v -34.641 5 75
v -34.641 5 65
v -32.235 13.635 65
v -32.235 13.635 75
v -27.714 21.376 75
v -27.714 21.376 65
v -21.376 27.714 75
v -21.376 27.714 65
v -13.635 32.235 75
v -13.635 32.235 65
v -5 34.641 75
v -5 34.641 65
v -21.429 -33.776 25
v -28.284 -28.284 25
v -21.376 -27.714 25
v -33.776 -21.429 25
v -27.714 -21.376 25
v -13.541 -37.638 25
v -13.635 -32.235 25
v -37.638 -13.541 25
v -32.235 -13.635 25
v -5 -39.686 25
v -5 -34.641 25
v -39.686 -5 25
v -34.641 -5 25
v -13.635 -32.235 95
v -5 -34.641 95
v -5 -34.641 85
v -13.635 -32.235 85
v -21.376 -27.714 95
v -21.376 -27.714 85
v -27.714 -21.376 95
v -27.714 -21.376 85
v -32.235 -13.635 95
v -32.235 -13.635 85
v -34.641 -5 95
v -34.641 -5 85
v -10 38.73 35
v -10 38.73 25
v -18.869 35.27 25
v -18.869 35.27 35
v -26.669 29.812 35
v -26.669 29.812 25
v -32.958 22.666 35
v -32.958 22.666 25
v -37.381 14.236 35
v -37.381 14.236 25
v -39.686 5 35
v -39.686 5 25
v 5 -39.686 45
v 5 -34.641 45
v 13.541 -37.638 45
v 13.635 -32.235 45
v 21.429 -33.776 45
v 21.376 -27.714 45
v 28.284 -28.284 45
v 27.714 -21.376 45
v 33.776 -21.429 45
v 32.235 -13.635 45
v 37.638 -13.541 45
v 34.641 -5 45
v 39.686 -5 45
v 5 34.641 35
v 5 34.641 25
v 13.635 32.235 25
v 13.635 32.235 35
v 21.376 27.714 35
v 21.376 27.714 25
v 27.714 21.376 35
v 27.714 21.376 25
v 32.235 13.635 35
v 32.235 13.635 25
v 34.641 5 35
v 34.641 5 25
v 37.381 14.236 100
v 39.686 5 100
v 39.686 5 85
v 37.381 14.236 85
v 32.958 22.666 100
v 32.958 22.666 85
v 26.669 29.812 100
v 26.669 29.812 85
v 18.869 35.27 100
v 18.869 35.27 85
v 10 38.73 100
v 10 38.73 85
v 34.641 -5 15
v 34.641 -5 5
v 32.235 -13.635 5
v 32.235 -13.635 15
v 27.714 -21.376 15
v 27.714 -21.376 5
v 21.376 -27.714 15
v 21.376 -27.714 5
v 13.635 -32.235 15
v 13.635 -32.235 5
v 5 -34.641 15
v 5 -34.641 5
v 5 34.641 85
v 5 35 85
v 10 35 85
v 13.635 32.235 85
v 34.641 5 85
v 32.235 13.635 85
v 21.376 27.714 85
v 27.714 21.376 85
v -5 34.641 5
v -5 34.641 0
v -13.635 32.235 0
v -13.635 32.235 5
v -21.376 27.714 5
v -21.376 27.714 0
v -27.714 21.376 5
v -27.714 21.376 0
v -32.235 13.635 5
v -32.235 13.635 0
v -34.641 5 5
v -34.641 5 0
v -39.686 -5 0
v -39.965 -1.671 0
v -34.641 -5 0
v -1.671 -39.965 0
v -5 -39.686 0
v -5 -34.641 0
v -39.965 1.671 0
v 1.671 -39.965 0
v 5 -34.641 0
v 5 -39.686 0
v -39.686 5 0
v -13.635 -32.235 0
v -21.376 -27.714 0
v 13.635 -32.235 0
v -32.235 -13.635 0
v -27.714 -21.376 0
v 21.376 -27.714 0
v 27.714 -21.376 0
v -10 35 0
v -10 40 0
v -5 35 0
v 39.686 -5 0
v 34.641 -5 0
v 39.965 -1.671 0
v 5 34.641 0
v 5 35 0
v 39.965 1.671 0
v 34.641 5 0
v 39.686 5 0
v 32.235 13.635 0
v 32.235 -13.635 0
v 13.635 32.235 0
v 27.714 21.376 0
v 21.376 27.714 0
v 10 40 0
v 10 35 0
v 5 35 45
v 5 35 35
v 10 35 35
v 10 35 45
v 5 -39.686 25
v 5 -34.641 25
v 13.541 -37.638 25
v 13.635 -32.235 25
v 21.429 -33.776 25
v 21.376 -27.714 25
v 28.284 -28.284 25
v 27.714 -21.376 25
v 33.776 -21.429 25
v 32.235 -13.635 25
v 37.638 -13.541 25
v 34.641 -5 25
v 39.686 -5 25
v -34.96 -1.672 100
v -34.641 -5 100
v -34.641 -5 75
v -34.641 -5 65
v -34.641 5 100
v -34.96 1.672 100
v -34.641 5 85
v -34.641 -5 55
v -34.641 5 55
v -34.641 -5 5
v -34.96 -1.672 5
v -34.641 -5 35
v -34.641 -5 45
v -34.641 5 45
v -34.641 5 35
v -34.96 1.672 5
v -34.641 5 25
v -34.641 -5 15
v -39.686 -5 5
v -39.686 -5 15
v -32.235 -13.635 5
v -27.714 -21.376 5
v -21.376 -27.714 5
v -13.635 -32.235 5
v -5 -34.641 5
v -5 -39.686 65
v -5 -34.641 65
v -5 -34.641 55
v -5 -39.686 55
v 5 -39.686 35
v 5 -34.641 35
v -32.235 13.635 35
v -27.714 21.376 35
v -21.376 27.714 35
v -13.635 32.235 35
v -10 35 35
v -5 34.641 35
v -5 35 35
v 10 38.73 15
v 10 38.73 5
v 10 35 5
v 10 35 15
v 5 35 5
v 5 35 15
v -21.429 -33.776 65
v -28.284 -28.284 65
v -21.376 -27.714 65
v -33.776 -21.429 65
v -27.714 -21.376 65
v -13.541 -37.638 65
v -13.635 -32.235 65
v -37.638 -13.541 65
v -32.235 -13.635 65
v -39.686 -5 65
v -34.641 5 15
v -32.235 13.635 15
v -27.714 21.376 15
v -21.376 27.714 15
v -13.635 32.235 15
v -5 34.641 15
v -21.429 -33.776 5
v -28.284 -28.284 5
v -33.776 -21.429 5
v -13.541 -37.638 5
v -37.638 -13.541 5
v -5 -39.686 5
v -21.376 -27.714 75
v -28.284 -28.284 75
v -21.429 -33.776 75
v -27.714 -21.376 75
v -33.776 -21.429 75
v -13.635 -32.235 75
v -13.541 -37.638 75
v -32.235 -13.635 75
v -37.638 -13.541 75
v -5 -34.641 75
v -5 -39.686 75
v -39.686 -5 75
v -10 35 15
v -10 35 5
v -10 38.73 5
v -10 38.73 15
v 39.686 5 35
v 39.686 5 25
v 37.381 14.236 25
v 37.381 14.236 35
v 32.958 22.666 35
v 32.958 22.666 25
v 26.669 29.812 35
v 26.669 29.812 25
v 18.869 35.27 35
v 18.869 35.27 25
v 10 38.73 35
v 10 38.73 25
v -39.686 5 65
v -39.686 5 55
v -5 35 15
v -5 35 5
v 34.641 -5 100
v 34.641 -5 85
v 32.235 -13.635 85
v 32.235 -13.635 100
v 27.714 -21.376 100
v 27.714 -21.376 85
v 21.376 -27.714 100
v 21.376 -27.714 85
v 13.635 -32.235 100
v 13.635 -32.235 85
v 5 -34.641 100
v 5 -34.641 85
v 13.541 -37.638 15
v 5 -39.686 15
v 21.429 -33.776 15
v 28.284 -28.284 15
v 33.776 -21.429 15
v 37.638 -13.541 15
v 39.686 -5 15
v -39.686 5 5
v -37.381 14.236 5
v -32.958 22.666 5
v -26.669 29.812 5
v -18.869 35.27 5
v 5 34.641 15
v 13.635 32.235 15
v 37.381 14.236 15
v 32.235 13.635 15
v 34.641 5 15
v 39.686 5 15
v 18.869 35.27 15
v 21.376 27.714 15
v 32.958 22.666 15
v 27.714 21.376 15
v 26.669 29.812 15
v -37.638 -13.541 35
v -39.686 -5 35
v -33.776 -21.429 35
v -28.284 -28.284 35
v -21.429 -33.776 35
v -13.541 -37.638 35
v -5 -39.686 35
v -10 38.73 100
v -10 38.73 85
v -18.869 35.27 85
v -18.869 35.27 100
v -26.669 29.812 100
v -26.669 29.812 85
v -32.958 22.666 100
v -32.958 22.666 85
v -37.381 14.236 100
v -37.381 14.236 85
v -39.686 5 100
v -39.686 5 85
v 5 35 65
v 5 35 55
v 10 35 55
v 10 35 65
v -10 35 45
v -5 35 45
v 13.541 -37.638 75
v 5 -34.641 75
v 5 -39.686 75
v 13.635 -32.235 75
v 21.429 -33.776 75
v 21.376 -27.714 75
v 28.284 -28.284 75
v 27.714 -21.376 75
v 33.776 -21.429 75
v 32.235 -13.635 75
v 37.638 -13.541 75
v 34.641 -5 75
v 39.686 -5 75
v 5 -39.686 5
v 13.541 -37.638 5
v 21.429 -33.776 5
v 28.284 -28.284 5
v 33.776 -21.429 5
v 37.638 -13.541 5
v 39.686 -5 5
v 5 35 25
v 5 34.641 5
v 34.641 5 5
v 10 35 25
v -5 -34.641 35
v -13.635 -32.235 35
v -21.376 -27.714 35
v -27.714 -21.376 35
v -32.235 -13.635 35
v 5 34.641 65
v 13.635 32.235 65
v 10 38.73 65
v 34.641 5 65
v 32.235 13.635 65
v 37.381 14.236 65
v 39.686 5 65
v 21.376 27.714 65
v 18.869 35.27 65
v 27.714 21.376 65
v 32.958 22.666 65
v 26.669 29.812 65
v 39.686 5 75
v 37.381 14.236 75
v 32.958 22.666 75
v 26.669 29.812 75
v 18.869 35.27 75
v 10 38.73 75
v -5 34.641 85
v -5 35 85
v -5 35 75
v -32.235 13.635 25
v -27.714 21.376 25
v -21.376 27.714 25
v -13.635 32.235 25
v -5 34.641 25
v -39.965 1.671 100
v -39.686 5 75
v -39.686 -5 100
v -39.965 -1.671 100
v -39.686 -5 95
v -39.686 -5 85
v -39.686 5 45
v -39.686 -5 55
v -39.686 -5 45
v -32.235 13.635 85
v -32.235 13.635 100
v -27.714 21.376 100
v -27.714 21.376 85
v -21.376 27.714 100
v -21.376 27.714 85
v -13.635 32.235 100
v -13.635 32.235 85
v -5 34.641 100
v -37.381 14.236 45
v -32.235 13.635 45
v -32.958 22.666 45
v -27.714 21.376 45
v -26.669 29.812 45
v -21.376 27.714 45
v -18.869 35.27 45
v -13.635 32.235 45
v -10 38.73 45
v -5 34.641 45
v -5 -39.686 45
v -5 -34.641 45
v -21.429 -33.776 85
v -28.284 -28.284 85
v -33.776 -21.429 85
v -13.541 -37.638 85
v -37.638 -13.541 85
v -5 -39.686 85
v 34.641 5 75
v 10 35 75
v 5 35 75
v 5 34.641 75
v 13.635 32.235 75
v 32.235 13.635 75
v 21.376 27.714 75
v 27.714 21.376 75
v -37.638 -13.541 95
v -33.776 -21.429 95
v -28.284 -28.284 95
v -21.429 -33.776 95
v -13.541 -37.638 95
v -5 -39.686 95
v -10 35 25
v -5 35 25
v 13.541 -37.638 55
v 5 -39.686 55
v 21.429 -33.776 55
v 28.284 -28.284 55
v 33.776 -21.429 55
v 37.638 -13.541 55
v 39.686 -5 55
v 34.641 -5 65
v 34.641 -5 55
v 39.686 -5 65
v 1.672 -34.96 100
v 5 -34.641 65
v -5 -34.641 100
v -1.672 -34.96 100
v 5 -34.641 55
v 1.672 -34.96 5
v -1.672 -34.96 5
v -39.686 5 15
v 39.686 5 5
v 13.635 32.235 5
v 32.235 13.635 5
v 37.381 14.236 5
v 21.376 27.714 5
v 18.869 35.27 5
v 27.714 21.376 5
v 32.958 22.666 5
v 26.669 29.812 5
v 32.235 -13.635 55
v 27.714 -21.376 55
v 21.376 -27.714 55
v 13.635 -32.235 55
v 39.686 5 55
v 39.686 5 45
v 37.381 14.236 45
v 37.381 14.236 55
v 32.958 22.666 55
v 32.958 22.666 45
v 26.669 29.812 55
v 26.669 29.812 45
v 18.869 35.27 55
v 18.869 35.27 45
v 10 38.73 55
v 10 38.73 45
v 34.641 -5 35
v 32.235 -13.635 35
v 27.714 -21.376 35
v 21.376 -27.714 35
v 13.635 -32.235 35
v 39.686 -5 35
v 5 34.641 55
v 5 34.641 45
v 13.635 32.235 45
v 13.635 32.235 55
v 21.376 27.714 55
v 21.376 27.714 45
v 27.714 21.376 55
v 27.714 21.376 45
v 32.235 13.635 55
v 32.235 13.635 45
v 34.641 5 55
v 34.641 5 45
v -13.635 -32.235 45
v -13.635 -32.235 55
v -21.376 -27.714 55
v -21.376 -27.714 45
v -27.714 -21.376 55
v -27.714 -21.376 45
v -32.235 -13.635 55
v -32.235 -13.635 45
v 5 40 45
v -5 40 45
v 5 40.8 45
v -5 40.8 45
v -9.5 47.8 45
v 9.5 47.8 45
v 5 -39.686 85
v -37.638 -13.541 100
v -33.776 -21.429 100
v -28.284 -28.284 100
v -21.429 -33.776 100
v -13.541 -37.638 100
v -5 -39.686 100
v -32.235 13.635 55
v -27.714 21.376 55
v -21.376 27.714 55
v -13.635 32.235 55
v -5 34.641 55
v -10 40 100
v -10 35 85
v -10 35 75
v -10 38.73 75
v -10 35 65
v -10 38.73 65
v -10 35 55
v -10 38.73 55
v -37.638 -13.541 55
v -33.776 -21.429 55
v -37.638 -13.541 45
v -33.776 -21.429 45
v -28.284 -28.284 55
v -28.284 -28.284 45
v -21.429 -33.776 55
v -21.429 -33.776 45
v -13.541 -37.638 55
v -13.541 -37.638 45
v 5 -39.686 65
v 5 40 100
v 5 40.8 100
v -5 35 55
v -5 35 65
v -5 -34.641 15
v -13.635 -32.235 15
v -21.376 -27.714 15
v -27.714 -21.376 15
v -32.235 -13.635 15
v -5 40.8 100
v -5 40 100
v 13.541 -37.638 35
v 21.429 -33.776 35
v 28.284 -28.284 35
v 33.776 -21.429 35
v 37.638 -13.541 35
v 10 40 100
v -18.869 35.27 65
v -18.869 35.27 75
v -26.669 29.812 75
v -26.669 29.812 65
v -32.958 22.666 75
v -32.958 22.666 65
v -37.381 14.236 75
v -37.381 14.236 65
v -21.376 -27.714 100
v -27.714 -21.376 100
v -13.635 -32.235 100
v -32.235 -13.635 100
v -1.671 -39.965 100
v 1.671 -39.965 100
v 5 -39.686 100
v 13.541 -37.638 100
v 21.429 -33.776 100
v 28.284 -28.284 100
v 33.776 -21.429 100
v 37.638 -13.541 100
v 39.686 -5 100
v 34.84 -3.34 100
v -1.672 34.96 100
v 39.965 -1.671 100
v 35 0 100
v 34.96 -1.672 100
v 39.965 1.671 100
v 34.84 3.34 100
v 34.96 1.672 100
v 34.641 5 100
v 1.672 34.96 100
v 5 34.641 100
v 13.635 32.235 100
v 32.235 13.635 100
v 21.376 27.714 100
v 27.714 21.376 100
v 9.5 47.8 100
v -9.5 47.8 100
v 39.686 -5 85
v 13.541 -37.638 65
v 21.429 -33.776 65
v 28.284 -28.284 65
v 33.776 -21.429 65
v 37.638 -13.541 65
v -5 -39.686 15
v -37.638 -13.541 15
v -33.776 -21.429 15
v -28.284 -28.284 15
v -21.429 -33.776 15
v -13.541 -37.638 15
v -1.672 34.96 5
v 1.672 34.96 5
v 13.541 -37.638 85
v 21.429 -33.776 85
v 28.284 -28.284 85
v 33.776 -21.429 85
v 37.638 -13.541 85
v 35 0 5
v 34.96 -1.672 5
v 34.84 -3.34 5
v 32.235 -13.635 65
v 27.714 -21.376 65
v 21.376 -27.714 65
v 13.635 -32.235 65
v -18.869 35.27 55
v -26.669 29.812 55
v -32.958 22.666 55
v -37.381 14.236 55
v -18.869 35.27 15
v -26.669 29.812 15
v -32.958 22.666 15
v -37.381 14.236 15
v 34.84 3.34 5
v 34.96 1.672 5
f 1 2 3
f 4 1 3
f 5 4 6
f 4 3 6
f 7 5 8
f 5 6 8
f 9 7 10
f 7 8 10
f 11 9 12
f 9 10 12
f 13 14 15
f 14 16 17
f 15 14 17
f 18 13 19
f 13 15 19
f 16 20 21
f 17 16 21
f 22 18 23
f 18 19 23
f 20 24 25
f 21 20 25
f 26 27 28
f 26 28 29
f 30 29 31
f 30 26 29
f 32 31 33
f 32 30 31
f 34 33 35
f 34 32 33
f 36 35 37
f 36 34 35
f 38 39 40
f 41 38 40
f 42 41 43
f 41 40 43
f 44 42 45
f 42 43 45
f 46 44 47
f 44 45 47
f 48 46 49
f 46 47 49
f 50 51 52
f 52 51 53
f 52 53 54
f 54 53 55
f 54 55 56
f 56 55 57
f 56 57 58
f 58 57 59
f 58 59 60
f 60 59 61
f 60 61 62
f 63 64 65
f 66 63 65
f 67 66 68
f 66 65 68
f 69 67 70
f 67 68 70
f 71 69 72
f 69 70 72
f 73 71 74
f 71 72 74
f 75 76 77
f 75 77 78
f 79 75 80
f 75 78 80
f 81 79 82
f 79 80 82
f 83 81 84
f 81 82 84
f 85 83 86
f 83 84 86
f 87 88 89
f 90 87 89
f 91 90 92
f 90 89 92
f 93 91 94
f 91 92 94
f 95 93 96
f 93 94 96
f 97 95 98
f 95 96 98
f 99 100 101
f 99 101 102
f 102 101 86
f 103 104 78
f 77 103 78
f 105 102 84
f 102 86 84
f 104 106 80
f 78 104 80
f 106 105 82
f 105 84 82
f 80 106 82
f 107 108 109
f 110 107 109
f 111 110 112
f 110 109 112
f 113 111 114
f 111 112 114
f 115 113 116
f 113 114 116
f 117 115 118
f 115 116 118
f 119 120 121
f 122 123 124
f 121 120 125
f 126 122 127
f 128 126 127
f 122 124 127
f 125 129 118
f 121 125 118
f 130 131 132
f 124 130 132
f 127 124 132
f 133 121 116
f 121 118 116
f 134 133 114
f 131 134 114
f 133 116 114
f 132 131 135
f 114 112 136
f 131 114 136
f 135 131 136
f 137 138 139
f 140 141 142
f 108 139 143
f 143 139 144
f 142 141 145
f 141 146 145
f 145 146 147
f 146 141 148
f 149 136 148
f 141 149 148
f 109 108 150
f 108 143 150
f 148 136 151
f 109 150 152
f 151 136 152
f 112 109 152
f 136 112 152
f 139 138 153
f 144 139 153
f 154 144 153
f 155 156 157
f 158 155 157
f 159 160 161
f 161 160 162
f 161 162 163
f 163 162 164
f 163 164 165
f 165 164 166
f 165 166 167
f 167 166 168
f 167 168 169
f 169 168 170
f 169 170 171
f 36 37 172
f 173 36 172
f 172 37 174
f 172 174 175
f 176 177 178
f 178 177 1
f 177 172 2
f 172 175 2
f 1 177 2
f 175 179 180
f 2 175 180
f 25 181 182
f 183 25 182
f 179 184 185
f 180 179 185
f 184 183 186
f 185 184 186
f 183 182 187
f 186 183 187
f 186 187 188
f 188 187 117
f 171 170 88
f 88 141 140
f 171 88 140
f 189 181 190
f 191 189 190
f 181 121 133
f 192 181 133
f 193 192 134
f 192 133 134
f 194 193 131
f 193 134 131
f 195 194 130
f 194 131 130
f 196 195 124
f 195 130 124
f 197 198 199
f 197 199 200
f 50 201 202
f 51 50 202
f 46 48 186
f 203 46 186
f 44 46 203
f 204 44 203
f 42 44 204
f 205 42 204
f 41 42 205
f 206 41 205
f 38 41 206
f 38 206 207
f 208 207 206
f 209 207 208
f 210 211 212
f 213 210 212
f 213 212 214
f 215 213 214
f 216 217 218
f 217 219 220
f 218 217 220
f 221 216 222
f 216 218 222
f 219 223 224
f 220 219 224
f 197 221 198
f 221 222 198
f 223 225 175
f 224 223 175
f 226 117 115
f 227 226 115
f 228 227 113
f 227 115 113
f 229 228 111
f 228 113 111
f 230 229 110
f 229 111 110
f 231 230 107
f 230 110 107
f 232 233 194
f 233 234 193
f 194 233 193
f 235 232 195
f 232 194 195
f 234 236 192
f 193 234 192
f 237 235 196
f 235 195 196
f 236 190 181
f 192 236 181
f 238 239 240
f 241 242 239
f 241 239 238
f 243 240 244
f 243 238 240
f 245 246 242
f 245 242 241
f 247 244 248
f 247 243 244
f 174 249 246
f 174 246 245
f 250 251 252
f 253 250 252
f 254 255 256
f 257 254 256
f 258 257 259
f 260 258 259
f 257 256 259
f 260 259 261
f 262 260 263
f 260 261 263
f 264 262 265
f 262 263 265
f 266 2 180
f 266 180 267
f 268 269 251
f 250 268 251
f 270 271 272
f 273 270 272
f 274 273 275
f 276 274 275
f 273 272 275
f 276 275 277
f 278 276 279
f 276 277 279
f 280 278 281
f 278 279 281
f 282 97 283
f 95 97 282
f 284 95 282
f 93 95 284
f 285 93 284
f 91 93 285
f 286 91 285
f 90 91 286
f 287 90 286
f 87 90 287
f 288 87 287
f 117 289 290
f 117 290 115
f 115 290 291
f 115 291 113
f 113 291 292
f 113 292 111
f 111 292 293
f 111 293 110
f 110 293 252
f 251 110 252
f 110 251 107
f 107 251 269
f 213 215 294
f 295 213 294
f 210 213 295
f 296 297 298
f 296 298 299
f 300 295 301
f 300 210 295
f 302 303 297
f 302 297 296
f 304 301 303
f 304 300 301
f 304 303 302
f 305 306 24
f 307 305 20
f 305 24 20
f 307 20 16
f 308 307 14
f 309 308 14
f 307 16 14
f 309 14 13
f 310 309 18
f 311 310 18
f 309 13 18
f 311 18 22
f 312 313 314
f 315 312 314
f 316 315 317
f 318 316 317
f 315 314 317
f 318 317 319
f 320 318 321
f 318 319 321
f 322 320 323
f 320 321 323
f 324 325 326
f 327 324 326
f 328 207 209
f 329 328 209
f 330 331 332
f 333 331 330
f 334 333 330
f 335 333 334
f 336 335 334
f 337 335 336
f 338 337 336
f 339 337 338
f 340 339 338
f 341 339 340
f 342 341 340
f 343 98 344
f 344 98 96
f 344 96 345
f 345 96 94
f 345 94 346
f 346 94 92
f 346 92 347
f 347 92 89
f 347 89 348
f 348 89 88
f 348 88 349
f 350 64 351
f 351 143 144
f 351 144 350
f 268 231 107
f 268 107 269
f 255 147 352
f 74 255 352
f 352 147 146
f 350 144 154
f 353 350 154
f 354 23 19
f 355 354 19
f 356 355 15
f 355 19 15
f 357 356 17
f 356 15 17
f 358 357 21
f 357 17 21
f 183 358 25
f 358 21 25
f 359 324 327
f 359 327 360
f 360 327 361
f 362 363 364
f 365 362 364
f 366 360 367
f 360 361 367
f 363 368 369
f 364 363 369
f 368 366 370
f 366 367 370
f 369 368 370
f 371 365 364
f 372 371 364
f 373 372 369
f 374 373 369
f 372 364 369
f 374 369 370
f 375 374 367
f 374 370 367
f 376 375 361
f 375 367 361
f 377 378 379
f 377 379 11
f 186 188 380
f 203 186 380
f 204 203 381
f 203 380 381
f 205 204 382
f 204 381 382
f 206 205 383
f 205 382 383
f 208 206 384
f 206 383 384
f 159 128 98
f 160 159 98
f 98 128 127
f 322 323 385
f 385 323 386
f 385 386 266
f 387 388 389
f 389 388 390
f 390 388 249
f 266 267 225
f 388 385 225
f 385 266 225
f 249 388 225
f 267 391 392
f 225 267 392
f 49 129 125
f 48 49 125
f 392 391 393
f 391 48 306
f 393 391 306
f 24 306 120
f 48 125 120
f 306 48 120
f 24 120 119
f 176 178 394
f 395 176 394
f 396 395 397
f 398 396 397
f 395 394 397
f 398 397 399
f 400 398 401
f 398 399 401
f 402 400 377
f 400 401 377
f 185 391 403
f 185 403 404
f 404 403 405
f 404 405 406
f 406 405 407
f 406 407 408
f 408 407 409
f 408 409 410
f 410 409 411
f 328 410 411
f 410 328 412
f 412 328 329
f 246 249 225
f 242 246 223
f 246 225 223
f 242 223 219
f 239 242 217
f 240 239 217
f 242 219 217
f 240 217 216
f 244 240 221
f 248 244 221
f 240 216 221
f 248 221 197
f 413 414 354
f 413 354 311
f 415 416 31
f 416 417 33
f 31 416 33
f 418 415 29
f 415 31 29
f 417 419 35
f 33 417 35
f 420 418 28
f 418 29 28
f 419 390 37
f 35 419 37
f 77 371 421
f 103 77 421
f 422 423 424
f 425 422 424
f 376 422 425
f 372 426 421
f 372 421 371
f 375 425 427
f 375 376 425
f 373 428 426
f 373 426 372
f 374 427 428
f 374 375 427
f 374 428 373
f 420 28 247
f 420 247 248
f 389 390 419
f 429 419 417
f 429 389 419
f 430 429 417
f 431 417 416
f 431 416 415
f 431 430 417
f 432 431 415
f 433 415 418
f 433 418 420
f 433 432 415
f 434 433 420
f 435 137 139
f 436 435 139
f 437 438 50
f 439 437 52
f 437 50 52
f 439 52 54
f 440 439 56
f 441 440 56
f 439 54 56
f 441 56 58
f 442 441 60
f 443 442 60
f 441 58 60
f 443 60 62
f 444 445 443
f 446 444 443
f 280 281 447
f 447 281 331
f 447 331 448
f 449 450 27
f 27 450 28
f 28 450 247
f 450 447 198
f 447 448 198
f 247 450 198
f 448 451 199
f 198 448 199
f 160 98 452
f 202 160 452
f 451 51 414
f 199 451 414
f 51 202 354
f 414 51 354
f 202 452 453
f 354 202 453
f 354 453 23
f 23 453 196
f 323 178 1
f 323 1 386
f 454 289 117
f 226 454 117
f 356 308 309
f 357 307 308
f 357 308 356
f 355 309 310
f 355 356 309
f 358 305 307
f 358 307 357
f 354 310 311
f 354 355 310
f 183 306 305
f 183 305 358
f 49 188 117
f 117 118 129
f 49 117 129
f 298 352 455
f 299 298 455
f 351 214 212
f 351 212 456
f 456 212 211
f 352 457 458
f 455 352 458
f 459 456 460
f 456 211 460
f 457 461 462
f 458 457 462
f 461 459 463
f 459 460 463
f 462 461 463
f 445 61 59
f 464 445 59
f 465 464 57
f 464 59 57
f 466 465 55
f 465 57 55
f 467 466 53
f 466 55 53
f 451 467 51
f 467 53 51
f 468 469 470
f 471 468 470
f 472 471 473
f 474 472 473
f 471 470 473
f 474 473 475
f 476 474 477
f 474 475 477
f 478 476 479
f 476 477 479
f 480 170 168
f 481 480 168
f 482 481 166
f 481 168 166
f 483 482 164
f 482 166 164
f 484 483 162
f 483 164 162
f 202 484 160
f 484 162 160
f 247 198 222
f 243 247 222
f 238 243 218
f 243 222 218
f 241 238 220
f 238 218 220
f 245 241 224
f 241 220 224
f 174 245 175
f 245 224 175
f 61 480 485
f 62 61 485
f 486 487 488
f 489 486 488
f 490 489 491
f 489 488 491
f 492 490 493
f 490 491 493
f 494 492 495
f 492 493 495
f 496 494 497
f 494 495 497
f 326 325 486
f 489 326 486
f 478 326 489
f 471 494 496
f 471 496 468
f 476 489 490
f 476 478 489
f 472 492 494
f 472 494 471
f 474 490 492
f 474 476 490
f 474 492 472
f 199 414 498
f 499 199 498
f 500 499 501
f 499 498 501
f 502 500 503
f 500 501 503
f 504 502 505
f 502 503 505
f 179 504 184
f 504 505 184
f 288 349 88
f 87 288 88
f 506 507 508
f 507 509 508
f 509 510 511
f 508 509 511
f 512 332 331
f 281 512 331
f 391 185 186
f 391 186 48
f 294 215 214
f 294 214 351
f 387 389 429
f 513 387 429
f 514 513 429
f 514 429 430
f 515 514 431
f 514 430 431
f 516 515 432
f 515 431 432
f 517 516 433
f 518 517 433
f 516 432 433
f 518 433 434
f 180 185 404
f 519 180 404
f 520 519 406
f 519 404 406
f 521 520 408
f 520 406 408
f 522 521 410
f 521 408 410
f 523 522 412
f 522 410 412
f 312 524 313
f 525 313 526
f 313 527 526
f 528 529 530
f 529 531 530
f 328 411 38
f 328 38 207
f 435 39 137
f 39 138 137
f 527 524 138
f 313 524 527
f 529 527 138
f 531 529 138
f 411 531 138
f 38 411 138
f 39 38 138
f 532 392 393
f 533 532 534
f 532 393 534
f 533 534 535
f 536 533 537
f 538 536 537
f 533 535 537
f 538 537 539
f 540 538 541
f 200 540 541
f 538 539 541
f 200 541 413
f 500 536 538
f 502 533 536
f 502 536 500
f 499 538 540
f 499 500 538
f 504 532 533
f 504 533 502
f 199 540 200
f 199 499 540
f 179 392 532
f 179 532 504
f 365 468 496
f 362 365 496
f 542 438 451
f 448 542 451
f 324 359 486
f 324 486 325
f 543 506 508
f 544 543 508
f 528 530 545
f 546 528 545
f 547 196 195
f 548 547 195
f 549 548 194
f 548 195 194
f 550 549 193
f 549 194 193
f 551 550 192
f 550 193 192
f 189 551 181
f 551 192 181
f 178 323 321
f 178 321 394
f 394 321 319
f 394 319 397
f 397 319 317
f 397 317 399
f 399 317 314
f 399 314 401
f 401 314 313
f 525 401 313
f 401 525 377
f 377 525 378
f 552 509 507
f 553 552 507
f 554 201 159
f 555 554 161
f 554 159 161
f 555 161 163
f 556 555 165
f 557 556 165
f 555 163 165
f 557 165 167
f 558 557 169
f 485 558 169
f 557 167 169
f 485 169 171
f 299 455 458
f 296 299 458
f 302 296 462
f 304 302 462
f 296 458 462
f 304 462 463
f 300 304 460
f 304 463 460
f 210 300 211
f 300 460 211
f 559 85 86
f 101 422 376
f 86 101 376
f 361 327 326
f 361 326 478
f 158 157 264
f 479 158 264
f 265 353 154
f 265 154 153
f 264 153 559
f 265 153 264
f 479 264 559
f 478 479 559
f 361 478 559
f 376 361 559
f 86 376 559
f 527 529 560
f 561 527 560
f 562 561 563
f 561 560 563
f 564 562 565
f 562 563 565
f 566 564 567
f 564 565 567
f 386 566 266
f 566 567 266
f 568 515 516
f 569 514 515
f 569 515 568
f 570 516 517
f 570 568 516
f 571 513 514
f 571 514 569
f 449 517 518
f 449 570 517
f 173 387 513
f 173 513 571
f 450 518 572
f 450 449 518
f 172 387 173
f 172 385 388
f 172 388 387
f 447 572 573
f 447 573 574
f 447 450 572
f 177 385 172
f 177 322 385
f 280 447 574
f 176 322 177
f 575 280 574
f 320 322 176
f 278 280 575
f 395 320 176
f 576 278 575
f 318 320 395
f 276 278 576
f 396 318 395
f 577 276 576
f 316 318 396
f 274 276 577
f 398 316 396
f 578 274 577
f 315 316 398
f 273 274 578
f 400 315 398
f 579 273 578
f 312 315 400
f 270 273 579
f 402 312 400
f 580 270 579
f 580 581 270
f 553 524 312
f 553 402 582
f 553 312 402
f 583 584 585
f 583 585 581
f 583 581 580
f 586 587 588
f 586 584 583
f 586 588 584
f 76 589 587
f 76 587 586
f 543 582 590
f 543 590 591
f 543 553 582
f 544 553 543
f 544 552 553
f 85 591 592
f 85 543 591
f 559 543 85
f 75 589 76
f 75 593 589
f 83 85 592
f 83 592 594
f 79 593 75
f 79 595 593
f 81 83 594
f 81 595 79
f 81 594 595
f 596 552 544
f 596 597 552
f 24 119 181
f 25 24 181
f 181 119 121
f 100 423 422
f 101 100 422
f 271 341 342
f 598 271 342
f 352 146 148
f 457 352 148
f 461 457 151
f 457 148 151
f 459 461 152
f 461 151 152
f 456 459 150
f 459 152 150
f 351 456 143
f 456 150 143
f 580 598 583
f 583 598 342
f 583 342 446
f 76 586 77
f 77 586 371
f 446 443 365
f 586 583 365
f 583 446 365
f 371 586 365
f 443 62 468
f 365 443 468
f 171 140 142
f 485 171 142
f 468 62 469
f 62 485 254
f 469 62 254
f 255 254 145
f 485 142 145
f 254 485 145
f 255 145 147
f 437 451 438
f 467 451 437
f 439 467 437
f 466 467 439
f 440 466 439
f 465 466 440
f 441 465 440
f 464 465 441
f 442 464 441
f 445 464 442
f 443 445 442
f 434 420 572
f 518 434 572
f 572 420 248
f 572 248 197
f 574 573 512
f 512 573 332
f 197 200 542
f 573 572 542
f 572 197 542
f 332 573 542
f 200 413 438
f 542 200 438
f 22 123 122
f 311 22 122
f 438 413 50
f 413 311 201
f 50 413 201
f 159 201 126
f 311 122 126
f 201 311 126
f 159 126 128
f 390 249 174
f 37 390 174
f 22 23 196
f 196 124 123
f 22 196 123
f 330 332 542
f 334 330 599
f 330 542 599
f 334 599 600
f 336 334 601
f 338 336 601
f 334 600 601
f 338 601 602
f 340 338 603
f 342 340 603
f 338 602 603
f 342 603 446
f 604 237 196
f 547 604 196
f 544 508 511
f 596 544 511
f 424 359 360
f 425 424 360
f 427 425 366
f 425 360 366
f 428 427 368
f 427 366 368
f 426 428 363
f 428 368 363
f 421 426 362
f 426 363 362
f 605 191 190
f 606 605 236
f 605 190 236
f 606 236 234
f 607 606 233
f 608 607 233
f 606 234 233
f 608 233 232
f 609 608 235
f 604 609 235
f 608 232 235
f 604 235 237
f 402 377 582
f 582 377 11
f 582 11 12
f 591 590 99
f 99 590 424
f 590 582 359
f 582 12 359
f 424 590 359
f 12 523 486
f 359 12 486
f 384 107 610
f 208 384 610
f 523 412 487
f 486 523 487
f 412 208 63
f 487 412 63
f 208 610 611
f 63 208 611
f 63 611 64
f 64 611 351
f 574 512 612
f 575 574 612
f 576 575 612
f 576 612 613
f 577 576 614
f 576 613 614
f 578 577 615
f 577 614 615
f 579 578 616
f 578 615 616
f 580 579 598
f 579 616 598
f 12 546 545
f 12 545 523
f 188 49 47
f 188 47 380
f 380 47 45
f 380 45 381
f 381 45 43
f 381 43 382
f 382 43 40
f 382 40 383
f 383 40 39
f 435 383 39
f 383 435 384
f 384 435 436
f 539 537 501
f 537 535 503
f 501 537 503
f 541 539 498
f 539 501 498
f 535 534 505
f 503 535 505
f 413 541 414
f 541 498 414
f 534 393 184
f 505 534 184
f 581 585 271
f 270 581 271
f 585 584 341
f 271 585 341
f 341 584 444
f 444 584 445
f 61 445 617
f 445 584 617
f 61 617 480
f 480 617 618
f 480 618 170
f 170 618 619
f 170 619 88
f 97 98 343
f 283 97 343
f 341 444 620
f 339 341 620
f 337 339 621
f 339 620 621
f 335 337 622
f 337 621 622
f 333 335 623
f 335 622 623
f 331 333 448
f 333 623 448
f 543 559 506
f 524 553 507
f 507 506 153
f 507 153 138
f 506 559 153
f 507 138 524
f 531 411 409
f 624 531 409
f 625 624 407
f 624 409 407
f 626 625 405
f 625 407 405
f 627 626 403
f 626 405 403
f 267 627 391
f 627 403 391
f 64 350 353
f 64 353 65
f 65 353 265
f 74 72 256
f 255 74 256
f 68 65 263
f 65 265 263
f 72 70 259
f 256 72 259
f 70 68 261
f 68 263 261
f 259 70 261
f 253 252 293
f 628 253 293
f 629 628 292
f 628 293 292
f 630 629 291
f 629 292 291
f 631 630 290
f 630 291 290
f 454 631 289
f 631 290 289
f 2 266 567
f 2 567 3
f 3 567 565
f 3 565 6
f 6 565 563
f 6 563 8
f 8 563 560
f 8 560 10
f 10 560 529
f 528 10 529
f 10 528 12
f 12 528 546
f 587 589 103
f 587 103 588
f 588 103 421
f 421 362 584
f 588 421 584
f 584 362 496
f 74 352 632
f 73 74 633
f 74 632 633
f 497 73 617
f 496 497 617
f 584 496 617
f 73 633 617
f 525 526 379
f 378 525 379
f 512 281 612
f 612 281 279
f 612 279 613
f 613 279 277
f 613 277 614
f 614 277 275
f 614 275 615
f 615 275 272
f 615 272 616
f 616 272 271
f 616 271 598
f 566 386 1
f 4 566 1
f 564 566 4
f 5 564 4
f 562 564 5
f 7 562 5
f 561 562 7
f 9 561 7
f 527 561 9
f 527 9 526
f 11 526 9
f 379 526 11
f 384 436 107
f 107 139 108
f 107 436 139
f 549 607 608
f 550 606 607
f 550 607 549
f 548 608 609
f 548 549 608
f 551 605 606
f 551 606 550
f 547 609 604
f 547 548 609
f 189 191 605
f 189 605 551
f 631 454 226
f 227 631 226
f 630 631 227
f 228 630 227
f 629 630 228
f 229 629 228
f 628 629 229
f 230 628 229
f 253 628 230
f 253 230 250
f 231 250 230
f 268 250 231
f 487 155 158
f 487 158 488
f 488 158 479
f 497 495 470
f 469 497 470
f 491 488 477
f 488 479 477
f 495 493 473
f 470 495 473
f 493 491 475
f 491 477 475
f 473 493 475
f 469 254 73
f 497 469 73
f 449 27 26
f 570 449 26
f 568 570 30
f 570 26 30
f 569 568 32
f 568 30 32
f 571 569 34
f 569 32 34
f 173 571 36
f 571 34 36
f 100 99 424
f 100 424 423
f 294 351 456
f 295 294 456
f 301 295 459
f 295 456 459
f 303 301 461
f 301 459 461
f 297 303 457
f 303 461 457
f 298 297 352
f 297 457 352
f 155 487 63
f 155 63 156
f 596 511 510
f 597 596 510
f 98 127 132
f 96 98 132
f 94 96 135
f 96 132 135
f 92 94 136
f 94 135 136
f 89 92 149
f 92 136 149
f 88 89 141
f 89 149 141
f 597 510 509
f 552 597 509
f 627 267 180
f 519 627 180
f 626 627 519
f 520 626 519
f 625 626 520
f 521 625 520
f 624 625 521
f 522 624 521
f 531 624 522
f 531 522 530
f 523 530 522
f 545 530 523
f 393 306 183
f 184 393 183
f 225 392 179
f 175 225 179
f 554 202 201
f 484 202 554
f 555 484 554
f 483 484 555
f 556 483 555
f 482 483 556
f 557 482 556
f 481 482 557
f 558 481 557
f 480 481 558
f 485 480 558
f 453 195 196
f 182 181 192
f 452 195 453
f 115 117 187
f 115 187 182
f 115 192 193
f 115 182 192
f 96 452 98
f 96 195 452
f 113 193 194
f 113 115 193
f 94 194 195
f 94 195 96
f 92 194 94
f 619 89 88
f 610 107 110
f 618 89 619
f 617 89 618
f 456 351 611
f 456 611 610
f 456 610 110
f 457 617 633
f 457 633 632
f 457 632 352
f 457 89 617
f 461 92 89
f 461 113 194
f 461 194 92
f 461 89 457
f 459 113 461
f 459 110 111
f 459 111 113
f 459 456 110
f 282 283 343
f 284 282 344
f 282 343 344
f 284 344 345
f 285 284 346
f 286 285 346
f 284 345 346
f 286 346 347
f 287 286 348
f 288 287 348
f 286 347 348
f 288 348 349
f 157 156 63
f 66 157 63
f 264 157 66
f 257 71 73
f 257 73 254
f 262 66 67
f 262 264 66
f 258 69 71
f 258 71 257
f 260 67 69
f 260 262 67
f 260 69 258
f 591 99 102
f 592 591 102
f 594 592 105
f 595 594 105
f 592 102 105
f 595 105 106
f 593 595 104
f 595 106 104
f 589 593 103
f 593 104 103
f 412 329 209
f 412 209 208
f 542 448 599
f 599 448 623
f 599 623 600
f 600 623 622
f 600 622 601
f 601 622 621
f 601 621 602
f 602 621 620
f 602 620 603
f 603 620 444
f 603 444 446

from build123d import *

# Parameters (mm, degrees)
F1_DEPTH = 5
F2_DEPTH = 100
F3_START = 5
F3_DEPTH = 10
F4_START = 25
F4_DEPTH = 10
F5_START = 45
F5_DEPTH = 55
F6_START = 45
F6_DEPTH = 10
F7_START = 65
F7_DEPTH = 10
F8_START = 85
F8_DEPTH = 15


# Not quite as in the source:
# - a pattern or mirror of a feature is missing from the dataset's text; its kind, count and spacing are read off the source's solid


with BuildPart() as f1:
    # F0 (on Top) → F1 (new body)
    with BuildSketch(Plane.XY):
        with BuildLine():
            ThreePointArc((34.6410161514, -5), (34.9101386799, -2.5064351879), (35, 0))
            ThreePointArc((35, 0), (34.9101386799, 2.5064351879), (34.6410161514, 5))
            ThreePointArc((34.6410161514, 5), (24.7487373415, 24.7487373415), (5, 34.6410161514))
            ThreePointArc((5, 34.6410161514), (0, 35), (-5, 34.6410161514))
            ThreePointArc((-5, 34.6410161514), (-24.7487373415, 24.7487373415), (-34.6410161514, 5))
            ThreePointArc((-34.6410161514, 5), (-35, 0), (-34.6410161514, -5))
            ThreePointArc((-34.6410161514, -5), (-24.7487373415, -24.7487373415), (-5, -34.6410161514))
            ThreePointArc((-5, -34.6410161514), (0, -35), (5, -34.6410161514))
            ThreePointArc((5, -34.6410161514), (24.7487373415, -24.7487373415), (34.6410161514, -5))
        make_face()
    extrude(amount=F1_DEPTH)

    # F0 (on Top) → F2 (join)
    with BuildSketch(Plane.XY):
        with BuildLine():
            ThreePointArc((-34.6410161514, -5), (-35, 0), (-34.6410161514, 5))
            Line((-34.6410161514, 5), (-39.686269666, 5))
            ThreePointArc((-39.686269666, 5), (-40, 0), (-39.686269666, -5))
            Line((-39.686269666, -5), (-34.6410161514, -5))
        make_face()
        with BuildLine():
            Line((5, -39.686269666), (5, -34.6410161514))
            ThreePointArc((5, -34.6410161514), (0, -35), (-5, -34.6410161514))
            Line((-5, -34.6410161514), (-5, -39.686269666))
            ThreePointArc((-5, -39.686269666), (0, -40), (5, -39.686269666))
        make_face()
        with BuildLine():
            ThreePointArc((34.6410161514, 5), (34.9101386799, 2.5064351879), (35, 0))
            ThreePointArc((35, 0), (34.9101386799, -2.5064351879), (34.6410161514, -5))
            Line((34.6410161514, -5), (39.686269666, -5))
            ThreePointArc((39.686269666, -5), (40, 0), (39.686269666, 5))
            Line((39.686269666, 5), (34.6410161514, 5))
        make_face()
        with BuildLine():
            ThreePointArc((-5, 34.6410161514), (0, 35), (5, 34.6410161514))
            Line((5, 34.6410161514), (5, 35))
            Line((5, 35), (10, 35))
            Line((10, 35), (10, 38.7298334621))
            Line((10, 38.7298334621), (10, 40))
            Line((10, 40), (5, 40))
            Line((5, 40), (-5, 40))
            Line((-5, 40), (-10, 40))
            Line((-10, 40), (-10, 38.7298334621))
            Line((-10, 38.7298334621), (-10, 35))
            Line((-10, 35), (-5, 35))
            Line((-5, 35), (-5, 34.6410161514))
        make_face()
    extrude(amount=F2_DEPTH)

    # F3_copies: F3 across plane


with BuildPart() as f3:
    # F0 (on Top) → F3 (new body)
    with BuildSketch(Plane.XY.offset(F3_START)):
        with BuildLine():
            Line((-5, -39.686269666), (-5, -34.6410161514))
            ThreePointArc((-5, -34.6410161514), (-24.7487373415, -24.7487373415), (-34.6410161514, -5))
            Line((-34.6410161514, -5), (-39.686269666, -5))
            ThreePointArc((-39.686269666, -5), (-28.2842712475, -28.2842712475), (-5, -39.686269666))
        make_face()
    extrude(amount=F3_DEPTH)


with BuildPart() as f3b:
    # F0 (on Top) → F3, piece 2 (new body)
    with BuildSketch(Plane.XY.offset(F3_START)):
        with BuildLine():
            Line((39.686269666, -5), (34.6410161514, -5))
            ThreePointArc((34.6410161514, -5), (24.7487373415, -24.7487373415), (5, -34.6410161514))
            Line((5, -34.6410161514), (5, -39.686269666))
            ThreePointArc((5, -39.686269666), (28.2842712475, -28.2842712475), (39.686269666, -5))
        make_face()
    extrude(amount=F3_DEPTH)


with BuildPart() as f3c:
    # F0 (on Top) → F3, piece 3 (new body)
    with BuildSketch(Plane.XY.offset(F3_START)):
        with BuildLine():
            ThreePointArc((5, 34.6410161514), (24.7487373415, 24.7487373415), (34.6410161514, 5))
            Line((34.6410161514, 5), (39.686269666, 5))
            ThreePointArc((39.686269666, 5), (30.0267674696, 26.4271306677), (10, 38.7298334621))
            Line((10, 38.7298334621), (10, 35))
            Line((10, 35), (5, 35))
            Line((5, 35), (5, 34.6410161514))
        make_face()
    extrude(amount=F3_DEPTH)


with BuildPart() as f3d:
    # F0 (on Top) → F3, piece 4 (new body)
    with BuildSketch(Plane.XY.offset(F3_START)):
        with BuildLine():
            ThreePointArc((-34.6410161514, 5), (-24.7487373415, 24.7487373415), (-5, 34.6410161514))
            Line((-5, 34.6410161514), (-5, 35))
            Line((-5, 35), (-10, 35))
            Line((-10, 35), (-10, 38.7298334621))
            ThreePointArc((-10, 38.7298334621), (-30.0267674696, 26.4271306677), (-39.686269666, 5))
            Line((-39.686269666, 5), (-34.6410161514, 5))
        make_face()
    extrude(amount=F3_DEPTH)


with BuildPart() as f1_1:
    add(f1.part)
    add(f3.part.mirror(Plane.XY.offset(50)))

    # F0 (on Top) → F4 (join)
    with BuildSketch(Plane.XY.offset(F4_START)):
        with BuildLine():
            Line((-5, -39.686269666), (-5, -34.6410161514))
            ThreePointArc((-5, -34.6410161514), (-24.7487373415, -24.7487373415), (-34.6410161514, -5))
            Line((-34.6410161514, -5), (-39.686269666, -5))
            ThreePointArc((-39.686269666, -5), (-28.2842712475, -28.2842712475), (-5, -39.686269666))
        make_face()
        with BuildLine():
            ThreePointArc((-34.6410161514, 5), (-24.7487373415, 24.7487373415), (-5, 34.6410161514))
            Line((-5, 34.6410161514), (-5, 35))
            Line((-5, 35), (-10, 35))
            Line((-10, 35), (-10, 38.7298334621))
            ThreePointArc((-10, 38.7298334621), (-30.0267674696, 26.4271306677), (-39.686269666, 5))
            Line((-39.686269666, 5), (-34.6410161514, 5))
        make_face()
        with BuildLine():
            ThreePointArc((5, 34.6410161514), (24.7487373415, 24.7487373415), (34.6410161514, 5))
            Line((34.6410161514, 5), (39.686269666, 5))
            ThreePointArc((39.686269666, 5), (30.0267674696, 26.4271306677), (10, 38.7298334621))
            Line((10, 38.7298334621), (10, 35))
            Line((10, 35), (5, 35))
            Line((5, 35), (5, 34.6410161514))
        make_face()
        with BuildLine():
            Line((39.686269666, -5), (34.6410161514, -5))
            ThreePointArc((34.6410161514, -5), (24.7487373415, -24.7487373415), (5, -34.6410161514))
            Line((5, -34.6410161514), (5, -39.686269666))
            ThreePointArc((5, -39.686269666), (28.2842712475, -28.2842712475), (39.686269666, -5))
        make_face()
    extrude(amount=F4_DEPTH)

    # F0 (on Top) → F5 (join)
    with BuildSketch(Plane.XY.offset(F5_START)):
        Polygon((-5, 40), (5, 40), (5, 40.8), (9.5, 47.8), (-9.5, 47.8), (-5, 40.8), align=None)
    extrude(amount=F5_DEPTH)

    # F0 (on Top) → F6 (join)
    with BuildSketch(Plane.XY.offset(F6_START)):
        with BuildLine():
            ThreePointArc((-34.6410161514, 5), (-24.7487373415, 24.7487373415), (-5, 34.6410161514))
            Line((-5, 34.6410161514), (-5, 35))
            Line((-5, 35), (-10, 35))
            Line((-10, 35), (-10, 38.7298334621))
            ThreePointArc((-10, 38.7298334621), (-30.0267674696, 26.4271306677), (-39.686269666, 5))
            Line((-39.686269666, 5), (-34.6410161514, 5))
        make_face()
        with BuildLine():
            Line((-5, -39.686269666), (-5, -34.6410161514))
            ThreePointArc((-5, -34.6410161514), (-24.7487373415, -24.7487373415), (-34.6410161514, -5))
            Line((-34.6410161514, -5), (-39.686269666, -5))
            ThreePointArc((-39.686269666, -5), (-28.2842712475, -28.2842712475), (-5, -39.686269666))
        make_face()
        with BuildLine():
            Line((39.686269666, -5), (34.6410161514, -5))
            ThreePointArc((34.6410161514, -5), (24.7487373415, -24.7487373415), (5, -34.6410161514))
            Line((5, -34.6410161514), (5, -39.686269666))
            ThreePointArc((5, -39.686269666), (28.2842712475, -28.2842712475), (39.686269666, -5))
        make_face()
        with BuildLine():
            ThreePointArc((5, 34.6410161514), (24.7487373415, 24.7487373415), (34.6410161514, 5))
            Line((34.6410161514, 5), (39.686269666, 5))
            ThreePointArc((39.686269666, 5), (30.0267674696, 26.4271306677), (10, 38.7298334621))
            Line((10, 38.7298334621), (10, 35))
            Line((10, 35), (5, 35))
            Line((5, 35), (5, 34.6410161514))
        make_face()
    extrude(amount=F6_DEPTH)

    # F0 (on Top) → F7 (join)
    with BuildSketch(Plane.XY.offset(F7_START)):
        with BuildLine():
            Line((39.686269666, -5), (34.6410161514, -5))
            ThreePointArc((34.6410161514, -5), (24.7487373415, -24.7487373415), (5, -34.6410161514))
            Line((5, -34.6410161514), (5, -39.686269666))
            ThreePointArc((5, -39.686269666), (28.2842712475, -28.2842712475), (39.686269666, -5))
        make_face()
        with BuildLine():
            Line((-5, -39.686269666), (-5, -34.6410161514))
            ThreePointArc((-5, -34.6410161514), (-24.7487373415, -24.7487373415), (-34.6410161514, -5))
            Line((-34.6410161514, -5), (-39.686269666, -5))
            ThreePointArc((-39.686269666, -5), (-28.2842712475, -28.2842712475), (-5, -39.686269666))
        make_face()
        with BuildLine():
            ThreePointArc((-34.6410161514, 5), (-24.7487373415, 24.7487373415), (-5, 34.6410161514))
            Line((-5, 34.6410161514), (-5, 35))
            Line((-5, 35), (-10, 35))
            Line((-10, 35), (-10, 38.7298334621))
            ThreePointArc((-10, 38.7298334621), (-30.0267674696, 26.4271306677), (-39.686269666, 5))
            Line((-39.686269666, 5), (-34.6410161514, 5))
        make_face()
        with BuildLine():
            ThreePointArc((5, 34.6410161514), (24.7487373415, 24.7487373415), (34.6410161514, 5))
            Line((34.6410161514, 5), (39.686269666, 5))
            ThreePointArc((39.686269666, 5), (30.0267674696, 26.4271306677), (10, 38.7298334621))
            Line((10, 38.7298334621), (10, 35))
            Line((10, 35), (5, 35))
            Line((5, 35), (5, 34.6410161514))
        make_face()
    extrude(amount=F7_DEPTH)

    # F0 (on Top) → F8 (join)
    with BuildSketch(Plane.XY.offset(F8_START)):
        with BuildLine():
            Line((39.686269666, -5), (34.6410161514, -5))
            ThreePointArc((34.6410161514, -5), (24.7487373415, -24.7487373415), (5, -34.6410161514))
            Line((5, -34.6410161514), (5, -39.686269666))
            ThreePointArc((5, -39.686269666), (28.2842712475, -28.2842712475), (39.686269666, -5))
        make_face()
        with BuildLine():
            Line((-5, -39.686269666), (-5, -34.6410161514))
            ThreePointArc((-5, -34.6410161514), (-24.7487373415, -24.7487373415), (-34.6410161514, -5))
            Line((-34.6410161514, -5), (-39.686269666, -5))
            ThreePointArc((-39.686269666, -5), (-28.2842712475, -28.2842712475), (-5, -39.686269666))
        make_face()
        with BuildLine():
            ThreePointArc((-34.6410161514, 5), (-24.7487373415, 24.7487373415), (-5, 34.6410161514))
            Line((-5, 34.6410161514), (-5, 35))
            Line((-5, 35), (-10, 35))
            Line((-10, 35), (-10, 38.7298334621))
            ThreePointArc((-10, 38.7298334621), (-30.0267674696, 26.4271306677), (-39.686269666, 5))
            Line((-39.686269666, 5), (-34.6410161514, 5))
        make_face()
        with BuildLine():
            ThreePointArc((5, 34.6410161514), (24.7487373415, 24.7487373415), (34.6410161514, 5))
            Line((34.6410161514, 5), (39.686269666, 5))
            ThreePointArc((39.686269666, 5), (30.0267674696, 26.4271306677), (10, 38.7298334621))
            Line((10, 38.7298334621), (10, 35))
            Line((10, 35), (5, 35))
            Line((5, 35), (5, 34.6410161514))
        make_face()
    extrude(amount=F8_DEPTH)


solid = Compound([f3.part, f3b.part, f3c.part, f3d.part, f1_1.part])
